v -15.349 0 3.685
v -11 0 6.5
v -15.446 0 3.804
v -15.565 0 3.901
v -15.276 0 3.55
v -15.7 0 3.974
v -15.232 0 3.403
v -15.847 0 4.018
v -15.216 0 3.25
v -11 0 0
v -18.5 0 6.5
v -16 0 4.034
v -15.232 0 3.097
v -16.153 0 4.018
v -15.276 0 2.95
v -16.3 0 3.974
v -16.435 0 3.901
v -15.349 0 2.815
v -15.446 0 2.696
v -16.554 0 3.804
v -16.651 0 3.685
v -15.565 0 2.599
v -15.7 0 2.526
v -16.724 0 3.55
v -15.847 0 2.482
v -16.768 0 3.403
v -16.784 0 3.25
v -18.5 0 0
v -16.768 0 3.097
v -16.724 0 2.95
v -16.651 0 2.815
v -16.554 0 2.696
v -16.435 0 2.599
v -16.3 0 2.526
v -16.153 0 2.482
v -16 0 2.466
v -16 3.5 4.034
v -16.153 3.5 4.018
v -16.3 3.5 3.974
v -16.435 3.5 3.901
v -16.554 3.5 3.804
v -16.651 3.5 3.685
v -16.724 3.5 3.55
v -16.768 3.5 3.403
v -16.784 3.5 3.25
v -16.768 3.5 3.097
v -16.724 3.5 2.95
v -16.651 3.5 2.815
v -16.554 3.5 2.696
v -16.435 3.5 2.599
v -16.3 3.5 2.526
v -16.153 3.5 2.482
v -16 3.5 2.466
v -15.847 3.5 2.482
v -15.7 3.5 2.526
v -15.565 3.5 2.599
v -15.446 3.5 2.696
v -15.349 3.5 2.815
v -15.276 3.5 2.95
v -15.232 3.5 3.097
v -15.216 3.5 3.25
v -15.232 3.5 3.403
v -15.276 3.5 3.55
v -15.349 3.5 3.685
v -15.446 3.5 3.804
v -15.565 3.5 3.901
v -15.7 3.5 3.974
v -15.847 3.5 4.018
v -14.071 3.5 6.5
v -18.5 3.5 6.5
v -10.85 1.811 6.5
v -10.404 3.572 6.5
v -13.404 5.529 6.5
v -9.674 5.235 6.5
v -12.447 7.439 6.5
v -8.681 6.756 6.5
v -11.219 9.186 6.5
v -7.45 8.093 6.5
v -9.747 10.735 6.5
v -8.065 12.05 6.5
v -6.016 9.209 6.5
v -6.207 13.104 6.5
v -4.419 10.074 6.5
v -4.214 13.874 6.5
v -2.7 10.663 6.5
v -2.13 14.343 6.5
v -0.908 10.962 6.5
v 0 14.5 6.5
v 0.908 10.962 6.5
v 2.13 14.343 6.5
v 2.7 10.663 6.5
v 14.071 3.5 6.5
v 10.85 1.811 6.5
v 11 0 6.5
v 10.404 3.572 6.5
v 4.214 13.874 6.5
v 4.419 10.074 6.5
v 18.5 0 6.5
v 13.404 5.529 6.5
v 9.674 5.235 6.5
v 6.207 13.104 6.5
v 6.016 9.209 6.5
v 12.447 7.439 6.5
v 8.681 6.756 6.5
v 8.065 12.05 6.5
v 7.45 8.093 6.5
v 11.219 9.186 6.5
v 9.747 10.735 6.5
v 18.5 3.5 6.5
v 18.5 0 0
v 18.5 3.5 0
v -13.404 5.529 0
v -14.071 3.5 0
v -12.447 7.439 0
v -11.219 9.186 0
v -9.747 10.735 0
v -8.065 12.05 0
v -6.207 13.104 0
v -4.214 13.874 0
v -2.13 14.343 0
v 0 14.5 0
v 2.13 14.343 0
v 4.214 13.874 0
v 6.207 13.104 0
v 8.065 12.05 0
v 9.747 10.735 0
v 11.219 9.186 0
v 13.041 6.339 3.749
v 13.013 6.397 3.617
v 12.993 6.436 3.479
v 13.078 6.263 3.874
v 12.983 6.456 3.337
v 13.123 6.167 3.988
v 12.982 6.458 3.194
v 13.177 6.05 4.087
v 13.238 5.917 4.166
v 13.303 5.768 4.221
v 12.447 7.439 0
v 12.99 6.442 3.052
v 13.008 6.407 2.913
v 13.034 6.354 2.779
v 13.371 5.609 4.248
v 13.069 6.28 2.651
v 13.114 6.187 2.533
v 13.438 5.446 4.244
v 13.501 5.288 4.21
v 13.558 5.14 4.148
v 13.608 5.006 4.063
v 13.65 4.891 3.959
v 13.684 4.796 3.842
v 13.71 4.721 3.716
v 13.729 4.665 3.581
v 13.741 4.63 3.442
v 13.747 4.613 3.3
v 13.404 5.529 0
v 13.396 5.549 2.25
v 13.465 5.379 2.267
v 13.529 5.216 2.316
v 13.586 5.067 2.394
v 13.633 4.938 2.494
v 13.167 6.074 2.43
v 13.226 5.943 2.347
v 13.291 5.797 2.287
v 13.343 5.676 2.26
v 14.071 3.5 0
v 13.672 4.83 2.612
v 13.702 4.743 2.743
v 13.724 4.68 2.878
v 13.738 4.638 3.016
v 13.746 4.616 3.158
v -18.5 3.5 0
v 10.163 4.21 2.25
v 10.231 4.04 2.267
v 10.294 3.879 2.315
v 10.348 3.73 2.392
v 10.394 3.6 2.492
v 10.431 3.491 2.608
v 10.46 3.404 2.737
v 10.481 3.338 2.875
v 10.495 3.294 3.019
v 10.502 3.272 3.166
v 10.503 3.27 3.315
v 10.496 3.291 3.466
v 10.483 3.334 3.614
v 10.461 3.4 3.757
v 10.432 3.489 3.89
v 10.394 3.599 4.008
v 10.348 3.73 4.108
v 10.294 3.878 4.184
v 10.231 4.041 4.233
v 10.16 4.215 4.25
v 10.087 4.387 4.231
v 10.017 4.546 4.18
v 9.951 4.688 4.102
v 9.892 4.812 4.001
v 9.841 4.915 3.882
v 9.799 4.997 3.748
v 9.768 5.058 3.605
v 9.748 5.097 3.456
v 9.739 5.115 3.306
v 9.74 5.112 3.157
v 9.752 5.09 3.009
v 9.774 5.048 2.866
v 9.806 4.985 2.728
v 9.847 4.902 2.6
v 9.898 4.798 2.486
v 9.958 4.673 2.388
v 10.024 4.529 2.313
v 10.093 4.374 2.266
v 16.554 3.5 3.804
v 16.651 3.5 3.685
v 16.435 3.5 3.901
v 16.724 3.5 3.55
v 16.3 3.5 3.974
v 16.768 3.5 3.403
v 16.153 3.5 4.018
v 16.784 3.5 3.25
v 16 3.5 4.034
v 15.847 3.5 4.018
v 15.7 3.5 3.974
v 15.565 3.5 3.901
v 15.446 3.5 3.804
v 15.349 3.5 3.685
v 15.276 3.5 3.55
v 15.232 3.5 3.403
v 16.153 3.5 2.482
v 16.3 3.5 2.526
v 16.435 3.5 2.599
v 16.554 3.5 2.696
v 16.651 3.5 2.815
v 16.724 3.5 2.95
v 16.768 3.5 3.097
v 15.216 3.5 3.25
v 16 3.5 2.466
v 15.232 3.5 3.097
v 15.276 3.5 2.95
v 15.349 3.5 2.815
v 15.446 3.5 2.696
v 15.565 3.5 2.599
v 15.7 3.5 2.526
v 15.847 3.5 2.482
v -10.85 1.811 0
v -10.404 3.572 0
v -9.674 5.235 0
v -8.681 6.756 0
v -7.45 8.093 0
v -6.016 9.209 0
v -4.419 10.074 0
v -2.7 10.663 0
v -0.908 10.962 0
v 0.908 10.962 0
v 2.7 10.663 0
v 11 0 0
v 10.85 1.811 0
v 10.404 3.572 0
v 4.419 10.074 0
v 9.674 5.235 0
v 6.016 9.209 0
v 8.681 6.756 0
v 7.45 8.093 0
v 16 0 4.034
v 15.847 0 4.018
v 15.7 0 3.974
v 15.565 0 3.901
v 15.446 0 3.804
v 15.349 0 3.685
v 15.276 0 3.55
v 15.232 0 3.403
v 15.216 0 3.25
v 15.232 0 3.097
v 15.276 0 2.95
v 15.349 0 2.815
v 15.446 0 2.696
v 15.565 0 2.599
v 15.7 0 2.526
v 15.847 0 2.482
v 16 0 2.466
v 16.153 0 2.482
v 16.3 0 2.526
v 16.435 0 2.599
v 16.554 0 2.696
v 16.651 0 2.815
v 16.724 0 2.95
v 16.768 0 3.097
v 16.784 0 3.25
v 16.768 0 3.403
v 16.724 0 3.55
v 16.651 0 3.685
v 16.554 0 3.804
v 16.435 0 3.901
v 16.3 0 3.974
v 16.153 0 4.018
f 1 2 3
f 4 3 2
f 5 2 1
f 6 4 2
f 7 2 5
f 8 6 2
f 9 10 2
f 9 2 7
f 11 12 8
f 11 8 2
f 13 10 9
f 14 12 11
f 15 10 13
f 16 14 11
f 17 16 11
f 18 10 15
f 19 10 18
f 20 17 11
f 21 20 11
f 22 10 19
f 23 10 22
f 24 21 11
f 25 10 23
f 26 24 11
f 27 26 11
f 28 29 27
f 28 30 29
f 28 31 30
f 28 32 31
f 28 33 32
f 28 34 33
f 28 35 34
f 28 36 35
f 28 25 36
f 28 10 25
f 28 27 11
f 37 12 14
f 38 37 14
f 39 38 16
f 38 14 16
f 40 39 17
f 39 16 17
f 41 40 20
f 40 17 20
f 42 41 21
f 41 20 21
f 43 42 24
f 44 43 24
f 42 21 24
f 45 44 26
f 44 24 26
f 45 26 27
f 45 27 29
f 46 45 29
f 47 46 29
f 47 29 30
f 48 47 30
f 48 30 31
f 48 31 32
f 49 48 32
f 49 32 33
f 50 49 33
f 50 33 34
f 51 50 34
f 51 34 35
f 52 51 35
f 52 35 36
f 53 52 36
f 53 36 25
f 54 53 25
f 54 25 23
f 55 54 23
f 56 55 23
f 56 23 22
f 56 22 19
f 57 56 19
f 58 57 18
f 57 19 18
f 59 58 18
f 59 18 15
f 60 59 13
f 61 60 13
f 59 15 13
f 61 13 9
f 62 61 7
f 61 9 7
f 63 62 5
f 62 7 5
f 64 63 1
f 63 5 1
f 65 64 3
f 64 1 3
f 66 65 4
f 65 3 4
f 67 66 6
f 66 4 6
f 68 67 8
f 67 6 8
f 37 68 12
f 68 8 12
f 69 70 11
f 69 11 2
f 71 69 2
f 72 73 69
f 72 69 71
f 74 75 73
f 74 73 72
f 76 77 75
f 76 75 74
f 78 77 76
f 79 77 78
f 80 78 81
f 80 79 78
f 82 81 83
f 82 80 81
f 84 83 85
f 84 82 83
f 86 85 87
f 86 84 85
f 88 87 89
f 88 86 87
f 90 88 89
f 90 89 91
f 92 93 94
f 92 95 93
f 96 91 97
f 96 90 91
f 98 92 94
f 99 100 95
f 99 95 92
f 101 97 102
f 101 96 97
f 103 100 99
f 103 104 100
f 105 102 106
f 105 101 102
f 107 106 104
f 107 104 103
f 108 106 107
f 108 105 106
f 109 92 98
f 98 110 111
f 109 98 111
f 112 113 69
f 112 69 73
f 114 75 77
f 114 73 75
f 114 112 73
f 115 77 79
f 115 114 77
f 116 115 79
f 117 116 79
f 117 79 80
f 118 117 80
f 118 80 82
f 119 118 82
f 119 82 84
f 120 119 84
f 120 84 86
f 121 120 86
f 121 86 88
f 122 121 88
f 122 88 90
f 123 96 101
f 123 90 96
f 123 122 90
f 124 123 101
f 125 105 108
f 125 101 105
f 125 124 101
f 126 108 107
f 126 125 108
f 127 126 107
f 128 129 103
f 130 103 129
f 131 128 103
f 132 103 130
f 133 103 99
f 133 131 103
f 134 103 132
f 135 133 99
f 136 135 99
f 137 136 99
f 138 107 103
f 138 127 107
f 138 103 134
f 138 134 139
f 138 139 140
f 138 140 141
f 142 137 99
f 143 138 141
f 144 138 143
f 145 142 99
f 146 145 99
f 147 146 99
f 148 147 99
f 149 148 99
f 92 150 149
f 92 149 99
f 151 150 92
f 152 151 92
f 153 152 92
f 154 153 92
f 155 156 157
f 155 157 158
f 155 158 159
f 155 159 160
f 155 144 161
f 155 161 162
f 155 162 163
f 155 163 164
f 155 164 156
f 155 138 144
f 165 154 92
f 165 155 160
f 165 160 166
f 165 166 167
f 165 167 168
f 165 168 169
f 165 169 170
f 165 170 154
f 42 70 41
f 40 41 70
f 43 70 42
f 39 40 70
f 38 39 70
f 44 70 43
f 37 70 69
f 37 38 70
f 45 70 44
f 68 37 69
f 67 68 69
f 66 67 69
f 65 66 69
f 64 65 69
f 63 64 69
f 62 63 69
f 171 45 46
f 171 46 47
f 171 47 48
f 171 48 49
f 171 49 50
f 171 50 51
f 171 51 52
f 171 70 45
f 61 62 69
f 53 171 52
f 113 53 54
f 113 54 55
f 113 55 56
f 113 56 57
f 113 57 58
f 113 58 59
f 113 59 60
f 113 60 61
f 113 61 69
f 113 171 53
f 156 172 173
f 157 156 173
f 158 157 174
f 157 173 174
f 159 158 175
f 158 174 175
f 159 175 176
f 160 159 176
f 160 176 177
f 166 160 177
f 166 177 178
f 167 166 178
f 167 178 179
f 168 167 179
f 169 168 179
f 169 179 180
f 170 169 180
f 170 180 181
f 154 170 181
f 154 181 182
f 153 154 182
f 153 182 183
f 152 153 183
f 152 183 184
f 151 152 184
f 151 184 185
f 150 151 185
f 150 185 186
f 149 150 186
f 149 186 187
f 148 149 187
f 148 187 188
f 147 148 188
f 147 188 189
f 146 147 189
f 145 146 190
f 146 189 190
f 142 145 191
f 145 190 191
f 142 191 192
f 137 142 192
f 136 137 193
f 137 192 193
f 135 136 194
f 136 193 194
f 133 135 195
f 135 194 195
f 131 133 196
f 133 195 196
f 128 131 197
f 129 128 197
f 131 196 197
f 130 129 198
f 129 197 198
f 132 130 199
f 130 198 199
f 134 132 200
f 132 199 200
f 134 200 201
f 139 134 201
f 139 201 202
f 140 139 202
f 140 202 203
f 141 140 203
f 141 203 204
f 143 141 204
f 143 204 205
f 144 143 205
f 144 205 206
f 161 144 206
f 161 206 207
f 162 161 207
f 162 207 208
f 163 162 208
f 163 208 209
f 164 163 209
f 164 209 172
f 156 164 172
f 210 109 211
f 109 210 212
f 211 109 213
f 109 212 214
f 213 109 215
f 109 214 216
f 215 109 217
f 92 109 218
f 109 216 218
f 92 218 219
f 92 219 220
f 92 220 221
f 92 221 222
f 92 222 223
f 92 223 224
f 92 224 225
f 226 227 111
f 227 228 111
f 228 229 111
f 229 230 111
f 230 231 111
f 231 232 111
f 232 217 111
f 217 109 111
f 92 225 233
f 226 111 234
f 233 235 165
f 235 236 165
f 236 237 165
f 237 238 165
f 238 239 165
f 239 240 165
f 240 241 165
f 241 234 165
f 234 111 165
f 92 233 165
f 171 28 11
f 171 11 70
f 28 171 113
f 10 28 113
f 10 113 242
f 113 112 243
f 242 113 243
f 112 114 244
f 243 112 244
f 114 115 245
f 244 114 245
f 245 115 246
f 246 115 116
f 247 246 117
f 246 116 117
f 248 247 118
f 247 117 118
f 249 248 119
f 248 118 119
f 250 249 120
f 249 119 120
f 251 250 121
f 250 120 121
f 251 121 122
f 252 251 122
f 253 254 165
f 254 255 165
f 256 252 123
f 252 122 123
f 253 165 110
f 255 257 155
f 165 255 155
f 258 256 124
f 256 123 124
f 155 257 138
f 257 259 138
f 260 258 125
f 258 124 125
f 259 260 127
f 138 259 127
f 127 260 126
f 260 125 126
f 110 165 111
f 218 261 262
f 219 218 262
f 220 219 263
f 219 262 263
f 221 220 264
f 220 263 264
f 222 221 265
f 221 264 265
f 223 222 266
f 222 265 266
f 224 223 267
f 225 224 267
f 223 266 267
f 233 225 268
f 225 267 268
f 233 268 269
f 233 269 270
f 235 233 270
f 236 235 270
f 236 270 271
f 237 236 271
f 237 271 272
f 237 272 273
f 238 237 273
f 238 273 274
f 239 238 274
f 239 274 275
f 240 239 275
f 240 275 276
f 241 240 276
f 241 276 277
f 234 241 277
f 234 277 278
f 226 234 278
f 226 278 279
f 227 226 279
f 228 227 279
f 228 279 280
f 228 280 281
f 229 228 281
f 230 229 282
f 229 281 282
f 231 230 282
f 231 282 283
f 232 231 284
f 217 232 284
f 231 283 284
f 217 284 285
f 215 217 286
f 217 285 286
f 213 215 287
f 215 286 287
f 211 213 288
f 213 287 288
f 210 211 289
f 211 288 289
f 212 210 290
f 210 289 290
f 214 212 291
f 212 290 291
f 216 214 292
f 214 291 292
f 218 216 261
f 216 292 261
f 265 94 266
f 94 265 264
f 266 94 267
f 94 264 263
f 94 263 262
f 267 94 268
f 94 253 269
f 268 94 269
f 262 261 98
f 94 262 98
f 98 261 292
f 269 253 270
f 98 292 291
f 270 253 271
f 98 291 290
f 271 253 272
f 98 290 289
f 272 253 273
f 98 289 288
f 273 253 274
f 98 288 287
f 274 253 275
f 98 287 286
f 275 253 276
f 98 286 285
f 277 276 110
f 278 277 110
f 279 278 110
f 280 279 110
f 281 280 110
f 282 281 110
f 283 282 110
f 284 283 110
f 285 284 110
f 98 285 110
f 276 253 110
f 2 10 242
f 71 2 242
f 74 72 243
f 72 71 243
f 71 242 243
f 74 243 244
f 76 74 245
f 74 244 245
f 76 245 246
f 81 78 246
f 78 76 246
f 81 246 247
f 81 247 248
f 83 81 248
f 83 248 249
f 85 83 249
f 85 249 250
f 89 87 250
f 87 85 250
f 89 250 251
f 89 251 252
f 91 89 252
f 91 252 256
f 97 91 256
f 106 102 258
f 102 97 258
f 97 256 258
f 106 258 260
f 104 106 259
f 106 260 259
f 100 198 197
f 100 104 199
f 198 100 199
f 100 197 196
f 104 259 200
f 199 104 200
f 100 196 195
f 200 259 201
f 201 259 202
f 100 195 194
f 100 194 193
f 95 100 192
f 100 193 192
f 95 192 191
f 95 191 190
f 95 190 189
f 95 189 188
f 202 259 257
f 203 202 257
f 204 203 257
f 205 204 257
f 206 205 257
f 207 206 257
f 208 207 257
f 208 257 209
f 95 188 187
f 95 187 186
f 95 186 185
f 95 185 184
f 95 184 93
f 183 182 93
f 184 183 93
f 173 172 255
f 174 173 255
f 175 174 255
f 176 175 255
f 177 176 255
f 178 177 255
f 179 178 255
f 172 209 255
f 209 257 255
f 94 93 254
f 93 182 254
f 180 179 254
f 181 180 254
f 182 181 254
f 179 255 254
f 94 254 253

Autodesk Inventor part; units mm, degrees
ref_plane "YZ Plane" through (0, 0, 0) normal (1, 0, 0) x (0, 1, 0)
ref_plane "XZ Plane" through (0, 0, 0) normal (0, 1, 0) x (-1, 0, 0)
sketch "Sketch1" plane through (0, 0, 0) normal (0, 0, 1) x (1, 0, 0)
  arc A0 (11, 0) -> (-11, 0) centre (0, 0) ccw
  arc A1 (14.0712, 3.5) -> (-14.0712, 3.5) centre (0, 0) ccw
  line L0 (-11, 0) -> (-18.5, 0)
  line L1 (-18.5, 0) -> (-18.5, 3.5)
  line L2 (11, 0) -> (18.5, 0)
  line L3 (18.5, 0) -> (18.5, 3.5)
  line L4 (-18.5, 3.5) -> (-14.0712, 3.5)
  line L5 (18.5, 3.5) -> (14.0712, 3.5)
  dimension "d2" = 11
  dimension "d3" = 14.5
  dimension "d4" = 7.5
  dimension "d5" = 3.5
  dimension "d6" = 18.5
extrude "Extrusion1" add sketch "Sketch1" along normal blind 6.5
sketch "Sketch2" plane through (0, 0, 6.5) normal (0, 0, 1) x (1, 0, 0)
  line L0 (-18.5, 3.5) -> (-18.5, 0) projected
  line L1 (-18.5, 0) -> (-11, 0) projected
  arc A0 (11, 0) -> (-11, 0) centre (0, 0) ccw projected
  line L2 (11, 0) -> (18.5, 0) projected
  line L3 (18.5, 0) -> (18.5, 3.5) projected
  line L4 (18.5, 3.5) -> (14.0712, 3.5) projected
  arc A1 (14.0712, 3.5) -> (-14.0712, 3.5) centre (0, 0) ccw projected
  line L5 (3.5, 14.0712) -> (3.5, 16.0712) projected
  line L6 (3.5, 16.0712) -> (-3.5, 16.0712) projected
  line L7 (-3.5, 16.0712) -> (-3.5, 14.0712) projected
  arc A2 (14.0712, 3.5) -> (-14.0712, 3.5) centre (0, 0) ccw projected
  line L8 (-14.0712, 3.5) -> (-18.5, 3.5) projected
  line L9 (0, 0) -> (18.5, 0)
  line L10 (0, 0) -> (23.4857, 9.7281)
  dimension "d11" = 22.5
ref_plane "Work Plane2" through (11.866, 9.4714, 3.25) normal (0.9239, 0.3827, 0) x (-0.3827, 0.9239, 0)
ref_plane "Work Plane1" through (-11, 0, 3.25) normal (0.9239, 0.3827, 0) x (-0.3827, 0.9239, 0)
sketch "Sketch3" plane through (11.866, 9.4714, 3.25) normal (0.9239, 0.3827, 0) x (-0.3827, 0.9239, 0)
  line L0 (-4.2095, 3.25) -> (-11.2892, 3.25) projected
  line L1 (-6.3608, -3.25) -> (4.4089, -3.25) projected
  line L2 (-6.3608, 3.25) -> (4.4089, 3.25) projected
  line L3 (-6.3608, -3.25) -> (-6.3608, 3.25) projected
  line L4 (-11.2892, -3.25) -> (-8.0556, -3.25) projected
  line L5 (-8.0556, -3.25) -> (-8.0556, 3.25) projected
  line L6 (-11.2892, 3.25) -> (-8.0556, 3.25) projected
  line L7 (-11.2892, -3.25) -> (-11.2892, 3.25) projected
  line L8 (-8.0556, -3.25) -> (-6.3608, -3.25) projected
  line L9 (-6.3608, -3.25) -> (-6.3608, 3.25) projected
  line L10 (-8.0556, 3.25) -> (-6.3608, 3.25) projected
  line L11 (-8.0556, -3.25) -> (-8.0556, 3.25) projected
  line L12 (4.4089, -3.25) -> (4.4089, 3.25) projected
  point P0 (-4.2095, -3.25)
  point P1 (-4.2095, 0)
  point P2 (-4.2095, 3.25)
  dimension "d13" = 3.25
hole "Hole1" at (13.4769, 5.5823, 3.25) direction (-0.9239, -0.3827, 0) diameter 2 end through all
sketch "Sketch5" plane through (-18.5, 3.5, 0) normal (0, 1, 0) x (1, 0, 0)
  line L0 (4.4288, 0) -> (0, 0) projected
  line L1 (0, 0) -> (0, -6.5) projected
  line L2 (37, 0) -> (37, -6.5) projected
  line L3 (37, 0) -> (32.5712, 0) projected
  point P0 (18.5, 0)
  point P1 (2.5, -3.25)
  point P2 (34.5, -3.25)
  point P3 (0, -3.25)
  dimension "d31" = 2.5
  dimension "d32" = 2.5
  dimension "d33" = 3.25
  dimension "d34" = 3.25
hole "Hole3" at (-16, 3.5, 3.25) at (16, 3.5, 3.25) direction (0, -1, 0) diameter 1.567 end through all thread size "M2x0.4" class "6H" standard "ANSI Metric M Profile"
properties part number "29 - Sheave Strap 1" material "Steel AISI 1020 107 HR"
